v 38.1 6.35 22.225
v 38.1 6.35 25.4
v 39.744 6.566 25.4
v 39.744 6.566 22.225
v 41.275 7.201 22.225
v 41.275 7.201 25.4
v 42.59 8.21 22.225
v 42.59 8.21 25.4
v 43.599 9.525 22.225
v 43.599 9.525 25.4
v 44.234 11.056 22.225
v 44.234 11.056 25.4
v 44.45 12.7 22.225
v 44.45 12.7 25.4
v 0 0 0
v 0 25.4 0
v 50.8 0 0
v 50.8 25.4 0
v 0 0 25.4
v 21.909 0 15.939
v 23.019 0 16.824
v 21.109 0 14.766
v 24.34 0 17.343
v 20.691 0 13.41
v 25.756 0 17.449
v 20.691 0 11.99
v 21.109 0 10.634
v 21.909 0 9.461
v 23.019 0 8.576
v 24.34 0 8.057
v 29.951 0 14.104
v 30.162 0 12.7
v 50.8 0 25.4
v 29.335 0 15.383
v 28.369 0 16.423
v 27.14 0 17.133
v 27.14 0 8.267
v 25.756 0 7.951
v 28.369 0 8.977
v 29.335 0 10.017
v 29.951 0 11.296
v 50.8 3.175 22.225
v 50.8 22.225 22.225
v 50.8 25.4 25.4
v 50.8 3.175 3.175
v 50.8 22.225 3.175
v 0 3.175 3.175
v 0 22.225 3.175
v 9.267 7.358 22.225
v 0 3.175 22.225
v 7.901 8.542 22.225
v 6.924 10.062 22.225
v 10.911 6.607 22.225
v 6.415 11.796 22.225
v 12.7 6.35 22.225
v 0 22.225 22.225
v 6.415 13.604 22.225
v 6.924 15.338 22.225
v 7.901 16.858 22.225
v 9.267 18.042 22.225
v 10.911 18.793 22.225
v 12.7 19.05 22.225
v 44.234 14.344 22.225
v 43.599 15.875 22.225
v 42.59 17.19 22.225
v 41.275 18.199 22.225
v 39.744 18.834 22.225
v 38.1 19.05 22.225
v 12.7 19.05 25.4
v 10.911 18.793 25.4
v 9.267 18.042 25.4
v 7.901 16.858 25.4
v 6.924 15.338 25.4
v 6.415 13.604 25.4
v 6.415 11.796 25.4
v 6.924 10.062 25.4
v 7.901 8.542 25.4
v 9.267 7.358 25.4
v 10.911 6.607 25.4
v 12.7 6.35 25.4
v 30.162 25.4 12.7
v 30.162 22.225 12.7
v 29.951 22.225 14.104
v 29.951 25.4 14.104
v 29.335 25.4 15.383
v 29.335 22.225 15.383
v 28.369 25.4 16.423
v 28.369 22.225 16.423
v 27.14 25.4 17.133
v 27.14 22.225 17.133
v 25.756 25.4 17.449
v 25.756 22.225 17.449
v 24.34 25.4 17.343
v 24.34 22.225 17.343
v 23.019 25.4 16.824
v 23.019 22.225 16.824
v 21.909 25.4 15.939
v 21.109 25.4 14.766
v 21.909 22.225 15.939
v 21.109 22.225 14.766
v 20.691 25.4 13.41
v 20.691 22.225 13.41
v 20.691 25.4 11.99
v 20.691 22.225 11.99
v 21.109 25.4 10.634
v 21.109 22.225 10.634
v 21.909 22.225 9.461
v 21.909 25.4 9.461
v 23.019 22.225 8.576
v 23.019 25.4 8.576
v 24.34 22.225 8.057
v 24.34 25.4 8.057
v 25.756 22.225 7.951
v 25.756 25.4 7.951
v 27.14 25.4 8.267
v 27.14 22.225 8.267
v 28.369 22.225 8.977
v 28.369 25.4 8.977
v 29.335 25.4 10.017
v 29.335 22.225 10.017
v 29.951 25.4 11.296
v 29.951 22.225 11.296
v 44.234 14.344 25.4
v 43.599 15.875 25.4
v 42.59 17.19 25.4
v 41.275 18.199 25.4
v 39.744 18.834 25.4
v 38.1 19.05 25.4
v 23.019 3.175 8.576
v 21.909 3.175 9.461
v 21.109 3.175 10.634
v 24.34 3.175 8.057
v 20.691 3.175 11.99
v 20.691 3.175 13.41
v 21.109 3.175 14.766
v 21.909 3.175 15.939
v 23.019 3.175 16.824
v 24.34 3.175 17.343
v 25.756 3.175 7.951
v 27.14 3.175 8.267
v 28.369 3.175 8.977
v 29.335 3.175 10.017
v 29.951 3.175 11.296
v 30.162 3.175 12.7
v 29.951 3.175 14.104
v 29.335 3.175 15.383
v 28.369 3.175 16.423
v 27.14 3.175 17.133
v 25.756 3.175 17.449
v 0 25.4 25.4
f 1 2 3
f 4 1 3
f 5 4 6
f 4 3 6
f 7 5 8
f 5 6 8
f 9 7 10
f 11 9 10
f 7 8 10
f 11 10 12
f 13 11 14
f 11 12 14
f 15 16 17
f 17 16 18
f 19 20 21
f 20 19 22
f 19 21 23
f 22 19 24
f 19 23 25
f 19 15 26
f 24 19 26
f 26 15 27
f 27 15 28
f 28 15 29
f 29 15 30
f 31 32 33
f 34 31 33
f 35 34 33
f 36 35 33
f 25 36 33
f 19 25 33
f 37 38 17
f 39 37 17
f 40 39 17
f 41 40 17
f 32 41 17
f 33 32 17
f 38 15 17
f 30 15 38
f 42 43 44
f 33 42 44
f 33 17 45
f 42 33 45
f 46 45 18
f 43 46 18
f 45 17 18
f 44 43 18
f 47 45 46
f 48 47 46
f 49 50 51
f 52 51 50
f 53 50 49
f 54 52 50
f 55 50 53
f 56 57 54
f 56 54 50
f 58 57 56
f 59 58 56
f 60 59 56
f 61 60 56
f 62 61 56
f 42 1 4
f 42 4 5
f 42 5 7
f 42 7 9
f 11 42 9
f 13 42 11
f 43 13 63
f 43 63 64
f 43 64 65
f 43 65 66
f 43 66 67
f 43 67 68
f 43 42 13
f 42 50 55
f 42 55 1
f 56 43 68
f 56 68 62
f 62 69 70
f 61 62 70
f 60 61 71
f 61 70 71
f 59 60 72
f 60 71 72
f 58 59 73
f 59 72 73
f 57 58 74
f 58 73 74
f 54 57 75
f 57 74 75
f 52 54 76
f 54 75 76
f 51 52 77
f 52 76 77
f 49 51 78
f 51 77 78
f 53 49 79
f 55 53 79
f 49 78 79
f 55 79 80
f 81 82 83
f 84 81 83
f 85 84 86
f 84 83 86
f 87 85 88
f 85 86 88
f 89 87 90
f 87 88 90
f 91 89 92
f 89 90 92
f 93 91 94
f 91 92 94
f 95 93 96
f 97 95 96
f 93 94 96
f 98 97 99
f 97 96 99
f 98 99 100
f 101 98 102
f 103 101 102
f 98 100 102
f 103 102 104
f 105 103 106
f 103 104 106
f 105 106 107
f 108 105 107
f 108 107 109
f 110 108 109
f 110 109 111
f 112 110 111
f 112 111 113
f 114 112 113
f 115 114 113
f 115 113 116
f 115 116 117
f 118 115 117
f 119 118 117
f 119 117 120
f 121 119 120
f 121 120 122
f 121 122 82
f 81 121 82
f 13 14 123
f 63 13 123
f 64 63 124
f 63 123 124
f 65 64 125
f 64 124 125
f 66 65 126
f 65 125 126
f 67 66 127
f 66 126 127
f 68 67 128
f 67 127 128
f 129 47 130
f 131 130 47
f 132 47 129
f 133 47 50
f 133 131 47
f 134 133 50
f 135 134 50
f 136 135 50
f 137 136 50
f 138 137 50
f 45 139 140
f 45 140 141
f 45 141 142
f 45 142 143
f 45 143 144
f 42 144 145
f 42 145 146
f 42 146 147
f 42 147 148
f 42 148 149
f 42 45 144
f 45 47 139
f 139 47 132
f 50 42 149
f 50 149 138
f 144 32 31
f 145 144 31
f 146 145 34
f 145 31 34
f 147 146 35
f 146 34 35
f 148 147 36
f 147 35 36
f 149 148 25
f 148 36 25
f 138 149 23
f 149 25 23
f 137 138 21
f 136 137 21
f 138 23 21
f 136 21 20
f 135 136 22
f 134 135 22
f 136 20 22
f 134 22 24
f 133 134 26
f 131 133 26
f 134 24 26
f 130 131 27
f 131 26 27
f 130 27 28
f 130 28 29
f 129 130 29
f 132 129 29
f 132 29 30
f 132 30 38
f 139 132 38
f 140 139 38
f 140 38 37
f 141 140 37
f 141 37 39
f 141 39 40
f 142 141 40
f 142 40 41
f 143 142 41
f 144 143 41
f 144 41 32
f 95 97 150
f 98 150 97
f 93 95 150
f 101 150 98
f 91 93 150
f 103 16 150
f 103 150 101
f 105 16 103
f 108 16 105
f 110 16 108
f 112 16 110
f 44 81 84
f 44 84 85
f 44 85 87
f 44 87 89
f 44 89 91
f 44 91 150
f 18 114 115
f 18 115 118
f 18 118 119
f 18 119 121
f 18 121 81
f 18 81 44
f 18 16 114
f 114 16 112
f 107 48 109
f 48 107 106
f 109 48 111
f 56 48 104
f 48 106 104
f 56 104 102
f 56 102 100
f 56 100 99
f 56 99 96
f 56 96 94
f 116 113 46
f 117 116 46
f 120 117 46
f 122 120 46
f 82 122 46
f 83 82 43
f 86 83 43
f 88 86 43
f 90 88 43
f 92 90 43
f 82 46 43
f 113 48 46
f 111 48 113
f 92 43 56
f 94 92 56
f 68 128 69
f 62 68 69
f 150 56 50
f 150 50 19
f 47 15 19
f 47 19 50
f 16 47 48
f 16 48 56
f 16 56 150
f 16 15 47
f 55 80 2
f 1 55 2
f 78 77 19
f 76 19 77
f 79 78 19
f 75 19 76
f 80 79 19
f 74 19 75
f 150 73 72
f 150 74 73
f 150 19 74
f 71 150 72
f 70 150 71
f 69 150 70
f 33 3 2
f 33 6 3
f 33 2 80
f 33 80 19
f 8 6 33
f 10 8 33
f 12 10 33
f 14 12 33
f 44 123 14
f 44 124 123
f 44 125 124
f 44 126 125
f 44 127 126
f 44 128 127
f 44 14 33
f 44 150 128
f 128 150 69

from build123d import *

# Parameters (mm, degrees)
F0_W     = 50.8
F0_H     = 25.4
F1_DEPTH = 25.4
F2_W     = 19.05
F2_H     = 19.05
F3_DEPTH = 50.801
F4_R     = 4.7625
F5_DEPTH = 25.401
F7_DEPTH = 3.175


with BuildPart() as f1:
    # F0 (on Top) → F1 (new body)
    with BuildSketch(Plane.XY):
        with Locations((25.4, 12.7)):
            Rectangle(F0_W, F0_H)
    extrude(amount=F1_DEPTH)

    # F2 (on face) → F3 (cut, through all)
    with BuildSketch(Plane.YZ.offset(50.8)):
        with Locations((12.7, 12.7)):
            Rectangle(F2_W, F2_H)
    extrude(amount=-F3_DEPTH, mode=Mode.SUBTRACT)

    # F4 (on face) → F5 (cut, through all)
    with BuildSketch(Plane.XZ):
        with Locations((25.4, 12.7)):
            Circle(F4_R)
    extrude(amount=-F5_DEPTH, mode=Mode.SUBTRACT)

    # F6 (on face) → F7 (cut, through all)
    with BuildSketch(Plane.XY.offset(25.4)):
        with BuildLine():
            ThreePointArc((12.7, 19.05), (6.35, 12.7), (12.7, 6.35))
            Line((12.7, 6.35), (12.7, 19.05))
        make_face()
        with BuildLine():
            Line((12.7, 19.05), (12.7, 6.35))
            ThreePointArc((12.7, 6.35), (17.190128, 8.209872), (19.05, 12.7))
            ThreePointArc((19.05, 12.7), (17.190128, 17.190128), (12.7, 19.05))
        make_face()
        with BuildLine():
            Line((12.7, 6.35), (38.1, 6.35))
            ThreePointArc((38.1, 6.35), (31.75, 12.7), (38.1, 19.05))
            Line((38.1, 19.05), (12.7, 19.05))
            ThreePointArc((12.7, 19.05), (17.190128, 17.190128), (19.05, 12.7))
            ThreePointArc((19.05, 12.7), (17.190128, 8.209872), (12.7, 6.35))
        make_face()
        with BuildLine():
            ThreePointArc((38.1, 19.05), (31.75, 12.7), (38.1, 6.35))
            Line((38.1, 6.35), (38.1, 19.05))
        make_face()
        with BuildLine():
            Line((38.1, 19.05), (38.1, 6.35))
            ThreePointArc((38.1, 6.35), (42.590128, 8.209872), (44.45, 12.7))
            ThreePointArc((44.45, 12.7), (42.590128, 17.190128), (38.1, 19.05))
        make_face()
    extrude(amount=-F7_DEPTH, mode=Mode.SUBTRACT)


solid = f1.part
